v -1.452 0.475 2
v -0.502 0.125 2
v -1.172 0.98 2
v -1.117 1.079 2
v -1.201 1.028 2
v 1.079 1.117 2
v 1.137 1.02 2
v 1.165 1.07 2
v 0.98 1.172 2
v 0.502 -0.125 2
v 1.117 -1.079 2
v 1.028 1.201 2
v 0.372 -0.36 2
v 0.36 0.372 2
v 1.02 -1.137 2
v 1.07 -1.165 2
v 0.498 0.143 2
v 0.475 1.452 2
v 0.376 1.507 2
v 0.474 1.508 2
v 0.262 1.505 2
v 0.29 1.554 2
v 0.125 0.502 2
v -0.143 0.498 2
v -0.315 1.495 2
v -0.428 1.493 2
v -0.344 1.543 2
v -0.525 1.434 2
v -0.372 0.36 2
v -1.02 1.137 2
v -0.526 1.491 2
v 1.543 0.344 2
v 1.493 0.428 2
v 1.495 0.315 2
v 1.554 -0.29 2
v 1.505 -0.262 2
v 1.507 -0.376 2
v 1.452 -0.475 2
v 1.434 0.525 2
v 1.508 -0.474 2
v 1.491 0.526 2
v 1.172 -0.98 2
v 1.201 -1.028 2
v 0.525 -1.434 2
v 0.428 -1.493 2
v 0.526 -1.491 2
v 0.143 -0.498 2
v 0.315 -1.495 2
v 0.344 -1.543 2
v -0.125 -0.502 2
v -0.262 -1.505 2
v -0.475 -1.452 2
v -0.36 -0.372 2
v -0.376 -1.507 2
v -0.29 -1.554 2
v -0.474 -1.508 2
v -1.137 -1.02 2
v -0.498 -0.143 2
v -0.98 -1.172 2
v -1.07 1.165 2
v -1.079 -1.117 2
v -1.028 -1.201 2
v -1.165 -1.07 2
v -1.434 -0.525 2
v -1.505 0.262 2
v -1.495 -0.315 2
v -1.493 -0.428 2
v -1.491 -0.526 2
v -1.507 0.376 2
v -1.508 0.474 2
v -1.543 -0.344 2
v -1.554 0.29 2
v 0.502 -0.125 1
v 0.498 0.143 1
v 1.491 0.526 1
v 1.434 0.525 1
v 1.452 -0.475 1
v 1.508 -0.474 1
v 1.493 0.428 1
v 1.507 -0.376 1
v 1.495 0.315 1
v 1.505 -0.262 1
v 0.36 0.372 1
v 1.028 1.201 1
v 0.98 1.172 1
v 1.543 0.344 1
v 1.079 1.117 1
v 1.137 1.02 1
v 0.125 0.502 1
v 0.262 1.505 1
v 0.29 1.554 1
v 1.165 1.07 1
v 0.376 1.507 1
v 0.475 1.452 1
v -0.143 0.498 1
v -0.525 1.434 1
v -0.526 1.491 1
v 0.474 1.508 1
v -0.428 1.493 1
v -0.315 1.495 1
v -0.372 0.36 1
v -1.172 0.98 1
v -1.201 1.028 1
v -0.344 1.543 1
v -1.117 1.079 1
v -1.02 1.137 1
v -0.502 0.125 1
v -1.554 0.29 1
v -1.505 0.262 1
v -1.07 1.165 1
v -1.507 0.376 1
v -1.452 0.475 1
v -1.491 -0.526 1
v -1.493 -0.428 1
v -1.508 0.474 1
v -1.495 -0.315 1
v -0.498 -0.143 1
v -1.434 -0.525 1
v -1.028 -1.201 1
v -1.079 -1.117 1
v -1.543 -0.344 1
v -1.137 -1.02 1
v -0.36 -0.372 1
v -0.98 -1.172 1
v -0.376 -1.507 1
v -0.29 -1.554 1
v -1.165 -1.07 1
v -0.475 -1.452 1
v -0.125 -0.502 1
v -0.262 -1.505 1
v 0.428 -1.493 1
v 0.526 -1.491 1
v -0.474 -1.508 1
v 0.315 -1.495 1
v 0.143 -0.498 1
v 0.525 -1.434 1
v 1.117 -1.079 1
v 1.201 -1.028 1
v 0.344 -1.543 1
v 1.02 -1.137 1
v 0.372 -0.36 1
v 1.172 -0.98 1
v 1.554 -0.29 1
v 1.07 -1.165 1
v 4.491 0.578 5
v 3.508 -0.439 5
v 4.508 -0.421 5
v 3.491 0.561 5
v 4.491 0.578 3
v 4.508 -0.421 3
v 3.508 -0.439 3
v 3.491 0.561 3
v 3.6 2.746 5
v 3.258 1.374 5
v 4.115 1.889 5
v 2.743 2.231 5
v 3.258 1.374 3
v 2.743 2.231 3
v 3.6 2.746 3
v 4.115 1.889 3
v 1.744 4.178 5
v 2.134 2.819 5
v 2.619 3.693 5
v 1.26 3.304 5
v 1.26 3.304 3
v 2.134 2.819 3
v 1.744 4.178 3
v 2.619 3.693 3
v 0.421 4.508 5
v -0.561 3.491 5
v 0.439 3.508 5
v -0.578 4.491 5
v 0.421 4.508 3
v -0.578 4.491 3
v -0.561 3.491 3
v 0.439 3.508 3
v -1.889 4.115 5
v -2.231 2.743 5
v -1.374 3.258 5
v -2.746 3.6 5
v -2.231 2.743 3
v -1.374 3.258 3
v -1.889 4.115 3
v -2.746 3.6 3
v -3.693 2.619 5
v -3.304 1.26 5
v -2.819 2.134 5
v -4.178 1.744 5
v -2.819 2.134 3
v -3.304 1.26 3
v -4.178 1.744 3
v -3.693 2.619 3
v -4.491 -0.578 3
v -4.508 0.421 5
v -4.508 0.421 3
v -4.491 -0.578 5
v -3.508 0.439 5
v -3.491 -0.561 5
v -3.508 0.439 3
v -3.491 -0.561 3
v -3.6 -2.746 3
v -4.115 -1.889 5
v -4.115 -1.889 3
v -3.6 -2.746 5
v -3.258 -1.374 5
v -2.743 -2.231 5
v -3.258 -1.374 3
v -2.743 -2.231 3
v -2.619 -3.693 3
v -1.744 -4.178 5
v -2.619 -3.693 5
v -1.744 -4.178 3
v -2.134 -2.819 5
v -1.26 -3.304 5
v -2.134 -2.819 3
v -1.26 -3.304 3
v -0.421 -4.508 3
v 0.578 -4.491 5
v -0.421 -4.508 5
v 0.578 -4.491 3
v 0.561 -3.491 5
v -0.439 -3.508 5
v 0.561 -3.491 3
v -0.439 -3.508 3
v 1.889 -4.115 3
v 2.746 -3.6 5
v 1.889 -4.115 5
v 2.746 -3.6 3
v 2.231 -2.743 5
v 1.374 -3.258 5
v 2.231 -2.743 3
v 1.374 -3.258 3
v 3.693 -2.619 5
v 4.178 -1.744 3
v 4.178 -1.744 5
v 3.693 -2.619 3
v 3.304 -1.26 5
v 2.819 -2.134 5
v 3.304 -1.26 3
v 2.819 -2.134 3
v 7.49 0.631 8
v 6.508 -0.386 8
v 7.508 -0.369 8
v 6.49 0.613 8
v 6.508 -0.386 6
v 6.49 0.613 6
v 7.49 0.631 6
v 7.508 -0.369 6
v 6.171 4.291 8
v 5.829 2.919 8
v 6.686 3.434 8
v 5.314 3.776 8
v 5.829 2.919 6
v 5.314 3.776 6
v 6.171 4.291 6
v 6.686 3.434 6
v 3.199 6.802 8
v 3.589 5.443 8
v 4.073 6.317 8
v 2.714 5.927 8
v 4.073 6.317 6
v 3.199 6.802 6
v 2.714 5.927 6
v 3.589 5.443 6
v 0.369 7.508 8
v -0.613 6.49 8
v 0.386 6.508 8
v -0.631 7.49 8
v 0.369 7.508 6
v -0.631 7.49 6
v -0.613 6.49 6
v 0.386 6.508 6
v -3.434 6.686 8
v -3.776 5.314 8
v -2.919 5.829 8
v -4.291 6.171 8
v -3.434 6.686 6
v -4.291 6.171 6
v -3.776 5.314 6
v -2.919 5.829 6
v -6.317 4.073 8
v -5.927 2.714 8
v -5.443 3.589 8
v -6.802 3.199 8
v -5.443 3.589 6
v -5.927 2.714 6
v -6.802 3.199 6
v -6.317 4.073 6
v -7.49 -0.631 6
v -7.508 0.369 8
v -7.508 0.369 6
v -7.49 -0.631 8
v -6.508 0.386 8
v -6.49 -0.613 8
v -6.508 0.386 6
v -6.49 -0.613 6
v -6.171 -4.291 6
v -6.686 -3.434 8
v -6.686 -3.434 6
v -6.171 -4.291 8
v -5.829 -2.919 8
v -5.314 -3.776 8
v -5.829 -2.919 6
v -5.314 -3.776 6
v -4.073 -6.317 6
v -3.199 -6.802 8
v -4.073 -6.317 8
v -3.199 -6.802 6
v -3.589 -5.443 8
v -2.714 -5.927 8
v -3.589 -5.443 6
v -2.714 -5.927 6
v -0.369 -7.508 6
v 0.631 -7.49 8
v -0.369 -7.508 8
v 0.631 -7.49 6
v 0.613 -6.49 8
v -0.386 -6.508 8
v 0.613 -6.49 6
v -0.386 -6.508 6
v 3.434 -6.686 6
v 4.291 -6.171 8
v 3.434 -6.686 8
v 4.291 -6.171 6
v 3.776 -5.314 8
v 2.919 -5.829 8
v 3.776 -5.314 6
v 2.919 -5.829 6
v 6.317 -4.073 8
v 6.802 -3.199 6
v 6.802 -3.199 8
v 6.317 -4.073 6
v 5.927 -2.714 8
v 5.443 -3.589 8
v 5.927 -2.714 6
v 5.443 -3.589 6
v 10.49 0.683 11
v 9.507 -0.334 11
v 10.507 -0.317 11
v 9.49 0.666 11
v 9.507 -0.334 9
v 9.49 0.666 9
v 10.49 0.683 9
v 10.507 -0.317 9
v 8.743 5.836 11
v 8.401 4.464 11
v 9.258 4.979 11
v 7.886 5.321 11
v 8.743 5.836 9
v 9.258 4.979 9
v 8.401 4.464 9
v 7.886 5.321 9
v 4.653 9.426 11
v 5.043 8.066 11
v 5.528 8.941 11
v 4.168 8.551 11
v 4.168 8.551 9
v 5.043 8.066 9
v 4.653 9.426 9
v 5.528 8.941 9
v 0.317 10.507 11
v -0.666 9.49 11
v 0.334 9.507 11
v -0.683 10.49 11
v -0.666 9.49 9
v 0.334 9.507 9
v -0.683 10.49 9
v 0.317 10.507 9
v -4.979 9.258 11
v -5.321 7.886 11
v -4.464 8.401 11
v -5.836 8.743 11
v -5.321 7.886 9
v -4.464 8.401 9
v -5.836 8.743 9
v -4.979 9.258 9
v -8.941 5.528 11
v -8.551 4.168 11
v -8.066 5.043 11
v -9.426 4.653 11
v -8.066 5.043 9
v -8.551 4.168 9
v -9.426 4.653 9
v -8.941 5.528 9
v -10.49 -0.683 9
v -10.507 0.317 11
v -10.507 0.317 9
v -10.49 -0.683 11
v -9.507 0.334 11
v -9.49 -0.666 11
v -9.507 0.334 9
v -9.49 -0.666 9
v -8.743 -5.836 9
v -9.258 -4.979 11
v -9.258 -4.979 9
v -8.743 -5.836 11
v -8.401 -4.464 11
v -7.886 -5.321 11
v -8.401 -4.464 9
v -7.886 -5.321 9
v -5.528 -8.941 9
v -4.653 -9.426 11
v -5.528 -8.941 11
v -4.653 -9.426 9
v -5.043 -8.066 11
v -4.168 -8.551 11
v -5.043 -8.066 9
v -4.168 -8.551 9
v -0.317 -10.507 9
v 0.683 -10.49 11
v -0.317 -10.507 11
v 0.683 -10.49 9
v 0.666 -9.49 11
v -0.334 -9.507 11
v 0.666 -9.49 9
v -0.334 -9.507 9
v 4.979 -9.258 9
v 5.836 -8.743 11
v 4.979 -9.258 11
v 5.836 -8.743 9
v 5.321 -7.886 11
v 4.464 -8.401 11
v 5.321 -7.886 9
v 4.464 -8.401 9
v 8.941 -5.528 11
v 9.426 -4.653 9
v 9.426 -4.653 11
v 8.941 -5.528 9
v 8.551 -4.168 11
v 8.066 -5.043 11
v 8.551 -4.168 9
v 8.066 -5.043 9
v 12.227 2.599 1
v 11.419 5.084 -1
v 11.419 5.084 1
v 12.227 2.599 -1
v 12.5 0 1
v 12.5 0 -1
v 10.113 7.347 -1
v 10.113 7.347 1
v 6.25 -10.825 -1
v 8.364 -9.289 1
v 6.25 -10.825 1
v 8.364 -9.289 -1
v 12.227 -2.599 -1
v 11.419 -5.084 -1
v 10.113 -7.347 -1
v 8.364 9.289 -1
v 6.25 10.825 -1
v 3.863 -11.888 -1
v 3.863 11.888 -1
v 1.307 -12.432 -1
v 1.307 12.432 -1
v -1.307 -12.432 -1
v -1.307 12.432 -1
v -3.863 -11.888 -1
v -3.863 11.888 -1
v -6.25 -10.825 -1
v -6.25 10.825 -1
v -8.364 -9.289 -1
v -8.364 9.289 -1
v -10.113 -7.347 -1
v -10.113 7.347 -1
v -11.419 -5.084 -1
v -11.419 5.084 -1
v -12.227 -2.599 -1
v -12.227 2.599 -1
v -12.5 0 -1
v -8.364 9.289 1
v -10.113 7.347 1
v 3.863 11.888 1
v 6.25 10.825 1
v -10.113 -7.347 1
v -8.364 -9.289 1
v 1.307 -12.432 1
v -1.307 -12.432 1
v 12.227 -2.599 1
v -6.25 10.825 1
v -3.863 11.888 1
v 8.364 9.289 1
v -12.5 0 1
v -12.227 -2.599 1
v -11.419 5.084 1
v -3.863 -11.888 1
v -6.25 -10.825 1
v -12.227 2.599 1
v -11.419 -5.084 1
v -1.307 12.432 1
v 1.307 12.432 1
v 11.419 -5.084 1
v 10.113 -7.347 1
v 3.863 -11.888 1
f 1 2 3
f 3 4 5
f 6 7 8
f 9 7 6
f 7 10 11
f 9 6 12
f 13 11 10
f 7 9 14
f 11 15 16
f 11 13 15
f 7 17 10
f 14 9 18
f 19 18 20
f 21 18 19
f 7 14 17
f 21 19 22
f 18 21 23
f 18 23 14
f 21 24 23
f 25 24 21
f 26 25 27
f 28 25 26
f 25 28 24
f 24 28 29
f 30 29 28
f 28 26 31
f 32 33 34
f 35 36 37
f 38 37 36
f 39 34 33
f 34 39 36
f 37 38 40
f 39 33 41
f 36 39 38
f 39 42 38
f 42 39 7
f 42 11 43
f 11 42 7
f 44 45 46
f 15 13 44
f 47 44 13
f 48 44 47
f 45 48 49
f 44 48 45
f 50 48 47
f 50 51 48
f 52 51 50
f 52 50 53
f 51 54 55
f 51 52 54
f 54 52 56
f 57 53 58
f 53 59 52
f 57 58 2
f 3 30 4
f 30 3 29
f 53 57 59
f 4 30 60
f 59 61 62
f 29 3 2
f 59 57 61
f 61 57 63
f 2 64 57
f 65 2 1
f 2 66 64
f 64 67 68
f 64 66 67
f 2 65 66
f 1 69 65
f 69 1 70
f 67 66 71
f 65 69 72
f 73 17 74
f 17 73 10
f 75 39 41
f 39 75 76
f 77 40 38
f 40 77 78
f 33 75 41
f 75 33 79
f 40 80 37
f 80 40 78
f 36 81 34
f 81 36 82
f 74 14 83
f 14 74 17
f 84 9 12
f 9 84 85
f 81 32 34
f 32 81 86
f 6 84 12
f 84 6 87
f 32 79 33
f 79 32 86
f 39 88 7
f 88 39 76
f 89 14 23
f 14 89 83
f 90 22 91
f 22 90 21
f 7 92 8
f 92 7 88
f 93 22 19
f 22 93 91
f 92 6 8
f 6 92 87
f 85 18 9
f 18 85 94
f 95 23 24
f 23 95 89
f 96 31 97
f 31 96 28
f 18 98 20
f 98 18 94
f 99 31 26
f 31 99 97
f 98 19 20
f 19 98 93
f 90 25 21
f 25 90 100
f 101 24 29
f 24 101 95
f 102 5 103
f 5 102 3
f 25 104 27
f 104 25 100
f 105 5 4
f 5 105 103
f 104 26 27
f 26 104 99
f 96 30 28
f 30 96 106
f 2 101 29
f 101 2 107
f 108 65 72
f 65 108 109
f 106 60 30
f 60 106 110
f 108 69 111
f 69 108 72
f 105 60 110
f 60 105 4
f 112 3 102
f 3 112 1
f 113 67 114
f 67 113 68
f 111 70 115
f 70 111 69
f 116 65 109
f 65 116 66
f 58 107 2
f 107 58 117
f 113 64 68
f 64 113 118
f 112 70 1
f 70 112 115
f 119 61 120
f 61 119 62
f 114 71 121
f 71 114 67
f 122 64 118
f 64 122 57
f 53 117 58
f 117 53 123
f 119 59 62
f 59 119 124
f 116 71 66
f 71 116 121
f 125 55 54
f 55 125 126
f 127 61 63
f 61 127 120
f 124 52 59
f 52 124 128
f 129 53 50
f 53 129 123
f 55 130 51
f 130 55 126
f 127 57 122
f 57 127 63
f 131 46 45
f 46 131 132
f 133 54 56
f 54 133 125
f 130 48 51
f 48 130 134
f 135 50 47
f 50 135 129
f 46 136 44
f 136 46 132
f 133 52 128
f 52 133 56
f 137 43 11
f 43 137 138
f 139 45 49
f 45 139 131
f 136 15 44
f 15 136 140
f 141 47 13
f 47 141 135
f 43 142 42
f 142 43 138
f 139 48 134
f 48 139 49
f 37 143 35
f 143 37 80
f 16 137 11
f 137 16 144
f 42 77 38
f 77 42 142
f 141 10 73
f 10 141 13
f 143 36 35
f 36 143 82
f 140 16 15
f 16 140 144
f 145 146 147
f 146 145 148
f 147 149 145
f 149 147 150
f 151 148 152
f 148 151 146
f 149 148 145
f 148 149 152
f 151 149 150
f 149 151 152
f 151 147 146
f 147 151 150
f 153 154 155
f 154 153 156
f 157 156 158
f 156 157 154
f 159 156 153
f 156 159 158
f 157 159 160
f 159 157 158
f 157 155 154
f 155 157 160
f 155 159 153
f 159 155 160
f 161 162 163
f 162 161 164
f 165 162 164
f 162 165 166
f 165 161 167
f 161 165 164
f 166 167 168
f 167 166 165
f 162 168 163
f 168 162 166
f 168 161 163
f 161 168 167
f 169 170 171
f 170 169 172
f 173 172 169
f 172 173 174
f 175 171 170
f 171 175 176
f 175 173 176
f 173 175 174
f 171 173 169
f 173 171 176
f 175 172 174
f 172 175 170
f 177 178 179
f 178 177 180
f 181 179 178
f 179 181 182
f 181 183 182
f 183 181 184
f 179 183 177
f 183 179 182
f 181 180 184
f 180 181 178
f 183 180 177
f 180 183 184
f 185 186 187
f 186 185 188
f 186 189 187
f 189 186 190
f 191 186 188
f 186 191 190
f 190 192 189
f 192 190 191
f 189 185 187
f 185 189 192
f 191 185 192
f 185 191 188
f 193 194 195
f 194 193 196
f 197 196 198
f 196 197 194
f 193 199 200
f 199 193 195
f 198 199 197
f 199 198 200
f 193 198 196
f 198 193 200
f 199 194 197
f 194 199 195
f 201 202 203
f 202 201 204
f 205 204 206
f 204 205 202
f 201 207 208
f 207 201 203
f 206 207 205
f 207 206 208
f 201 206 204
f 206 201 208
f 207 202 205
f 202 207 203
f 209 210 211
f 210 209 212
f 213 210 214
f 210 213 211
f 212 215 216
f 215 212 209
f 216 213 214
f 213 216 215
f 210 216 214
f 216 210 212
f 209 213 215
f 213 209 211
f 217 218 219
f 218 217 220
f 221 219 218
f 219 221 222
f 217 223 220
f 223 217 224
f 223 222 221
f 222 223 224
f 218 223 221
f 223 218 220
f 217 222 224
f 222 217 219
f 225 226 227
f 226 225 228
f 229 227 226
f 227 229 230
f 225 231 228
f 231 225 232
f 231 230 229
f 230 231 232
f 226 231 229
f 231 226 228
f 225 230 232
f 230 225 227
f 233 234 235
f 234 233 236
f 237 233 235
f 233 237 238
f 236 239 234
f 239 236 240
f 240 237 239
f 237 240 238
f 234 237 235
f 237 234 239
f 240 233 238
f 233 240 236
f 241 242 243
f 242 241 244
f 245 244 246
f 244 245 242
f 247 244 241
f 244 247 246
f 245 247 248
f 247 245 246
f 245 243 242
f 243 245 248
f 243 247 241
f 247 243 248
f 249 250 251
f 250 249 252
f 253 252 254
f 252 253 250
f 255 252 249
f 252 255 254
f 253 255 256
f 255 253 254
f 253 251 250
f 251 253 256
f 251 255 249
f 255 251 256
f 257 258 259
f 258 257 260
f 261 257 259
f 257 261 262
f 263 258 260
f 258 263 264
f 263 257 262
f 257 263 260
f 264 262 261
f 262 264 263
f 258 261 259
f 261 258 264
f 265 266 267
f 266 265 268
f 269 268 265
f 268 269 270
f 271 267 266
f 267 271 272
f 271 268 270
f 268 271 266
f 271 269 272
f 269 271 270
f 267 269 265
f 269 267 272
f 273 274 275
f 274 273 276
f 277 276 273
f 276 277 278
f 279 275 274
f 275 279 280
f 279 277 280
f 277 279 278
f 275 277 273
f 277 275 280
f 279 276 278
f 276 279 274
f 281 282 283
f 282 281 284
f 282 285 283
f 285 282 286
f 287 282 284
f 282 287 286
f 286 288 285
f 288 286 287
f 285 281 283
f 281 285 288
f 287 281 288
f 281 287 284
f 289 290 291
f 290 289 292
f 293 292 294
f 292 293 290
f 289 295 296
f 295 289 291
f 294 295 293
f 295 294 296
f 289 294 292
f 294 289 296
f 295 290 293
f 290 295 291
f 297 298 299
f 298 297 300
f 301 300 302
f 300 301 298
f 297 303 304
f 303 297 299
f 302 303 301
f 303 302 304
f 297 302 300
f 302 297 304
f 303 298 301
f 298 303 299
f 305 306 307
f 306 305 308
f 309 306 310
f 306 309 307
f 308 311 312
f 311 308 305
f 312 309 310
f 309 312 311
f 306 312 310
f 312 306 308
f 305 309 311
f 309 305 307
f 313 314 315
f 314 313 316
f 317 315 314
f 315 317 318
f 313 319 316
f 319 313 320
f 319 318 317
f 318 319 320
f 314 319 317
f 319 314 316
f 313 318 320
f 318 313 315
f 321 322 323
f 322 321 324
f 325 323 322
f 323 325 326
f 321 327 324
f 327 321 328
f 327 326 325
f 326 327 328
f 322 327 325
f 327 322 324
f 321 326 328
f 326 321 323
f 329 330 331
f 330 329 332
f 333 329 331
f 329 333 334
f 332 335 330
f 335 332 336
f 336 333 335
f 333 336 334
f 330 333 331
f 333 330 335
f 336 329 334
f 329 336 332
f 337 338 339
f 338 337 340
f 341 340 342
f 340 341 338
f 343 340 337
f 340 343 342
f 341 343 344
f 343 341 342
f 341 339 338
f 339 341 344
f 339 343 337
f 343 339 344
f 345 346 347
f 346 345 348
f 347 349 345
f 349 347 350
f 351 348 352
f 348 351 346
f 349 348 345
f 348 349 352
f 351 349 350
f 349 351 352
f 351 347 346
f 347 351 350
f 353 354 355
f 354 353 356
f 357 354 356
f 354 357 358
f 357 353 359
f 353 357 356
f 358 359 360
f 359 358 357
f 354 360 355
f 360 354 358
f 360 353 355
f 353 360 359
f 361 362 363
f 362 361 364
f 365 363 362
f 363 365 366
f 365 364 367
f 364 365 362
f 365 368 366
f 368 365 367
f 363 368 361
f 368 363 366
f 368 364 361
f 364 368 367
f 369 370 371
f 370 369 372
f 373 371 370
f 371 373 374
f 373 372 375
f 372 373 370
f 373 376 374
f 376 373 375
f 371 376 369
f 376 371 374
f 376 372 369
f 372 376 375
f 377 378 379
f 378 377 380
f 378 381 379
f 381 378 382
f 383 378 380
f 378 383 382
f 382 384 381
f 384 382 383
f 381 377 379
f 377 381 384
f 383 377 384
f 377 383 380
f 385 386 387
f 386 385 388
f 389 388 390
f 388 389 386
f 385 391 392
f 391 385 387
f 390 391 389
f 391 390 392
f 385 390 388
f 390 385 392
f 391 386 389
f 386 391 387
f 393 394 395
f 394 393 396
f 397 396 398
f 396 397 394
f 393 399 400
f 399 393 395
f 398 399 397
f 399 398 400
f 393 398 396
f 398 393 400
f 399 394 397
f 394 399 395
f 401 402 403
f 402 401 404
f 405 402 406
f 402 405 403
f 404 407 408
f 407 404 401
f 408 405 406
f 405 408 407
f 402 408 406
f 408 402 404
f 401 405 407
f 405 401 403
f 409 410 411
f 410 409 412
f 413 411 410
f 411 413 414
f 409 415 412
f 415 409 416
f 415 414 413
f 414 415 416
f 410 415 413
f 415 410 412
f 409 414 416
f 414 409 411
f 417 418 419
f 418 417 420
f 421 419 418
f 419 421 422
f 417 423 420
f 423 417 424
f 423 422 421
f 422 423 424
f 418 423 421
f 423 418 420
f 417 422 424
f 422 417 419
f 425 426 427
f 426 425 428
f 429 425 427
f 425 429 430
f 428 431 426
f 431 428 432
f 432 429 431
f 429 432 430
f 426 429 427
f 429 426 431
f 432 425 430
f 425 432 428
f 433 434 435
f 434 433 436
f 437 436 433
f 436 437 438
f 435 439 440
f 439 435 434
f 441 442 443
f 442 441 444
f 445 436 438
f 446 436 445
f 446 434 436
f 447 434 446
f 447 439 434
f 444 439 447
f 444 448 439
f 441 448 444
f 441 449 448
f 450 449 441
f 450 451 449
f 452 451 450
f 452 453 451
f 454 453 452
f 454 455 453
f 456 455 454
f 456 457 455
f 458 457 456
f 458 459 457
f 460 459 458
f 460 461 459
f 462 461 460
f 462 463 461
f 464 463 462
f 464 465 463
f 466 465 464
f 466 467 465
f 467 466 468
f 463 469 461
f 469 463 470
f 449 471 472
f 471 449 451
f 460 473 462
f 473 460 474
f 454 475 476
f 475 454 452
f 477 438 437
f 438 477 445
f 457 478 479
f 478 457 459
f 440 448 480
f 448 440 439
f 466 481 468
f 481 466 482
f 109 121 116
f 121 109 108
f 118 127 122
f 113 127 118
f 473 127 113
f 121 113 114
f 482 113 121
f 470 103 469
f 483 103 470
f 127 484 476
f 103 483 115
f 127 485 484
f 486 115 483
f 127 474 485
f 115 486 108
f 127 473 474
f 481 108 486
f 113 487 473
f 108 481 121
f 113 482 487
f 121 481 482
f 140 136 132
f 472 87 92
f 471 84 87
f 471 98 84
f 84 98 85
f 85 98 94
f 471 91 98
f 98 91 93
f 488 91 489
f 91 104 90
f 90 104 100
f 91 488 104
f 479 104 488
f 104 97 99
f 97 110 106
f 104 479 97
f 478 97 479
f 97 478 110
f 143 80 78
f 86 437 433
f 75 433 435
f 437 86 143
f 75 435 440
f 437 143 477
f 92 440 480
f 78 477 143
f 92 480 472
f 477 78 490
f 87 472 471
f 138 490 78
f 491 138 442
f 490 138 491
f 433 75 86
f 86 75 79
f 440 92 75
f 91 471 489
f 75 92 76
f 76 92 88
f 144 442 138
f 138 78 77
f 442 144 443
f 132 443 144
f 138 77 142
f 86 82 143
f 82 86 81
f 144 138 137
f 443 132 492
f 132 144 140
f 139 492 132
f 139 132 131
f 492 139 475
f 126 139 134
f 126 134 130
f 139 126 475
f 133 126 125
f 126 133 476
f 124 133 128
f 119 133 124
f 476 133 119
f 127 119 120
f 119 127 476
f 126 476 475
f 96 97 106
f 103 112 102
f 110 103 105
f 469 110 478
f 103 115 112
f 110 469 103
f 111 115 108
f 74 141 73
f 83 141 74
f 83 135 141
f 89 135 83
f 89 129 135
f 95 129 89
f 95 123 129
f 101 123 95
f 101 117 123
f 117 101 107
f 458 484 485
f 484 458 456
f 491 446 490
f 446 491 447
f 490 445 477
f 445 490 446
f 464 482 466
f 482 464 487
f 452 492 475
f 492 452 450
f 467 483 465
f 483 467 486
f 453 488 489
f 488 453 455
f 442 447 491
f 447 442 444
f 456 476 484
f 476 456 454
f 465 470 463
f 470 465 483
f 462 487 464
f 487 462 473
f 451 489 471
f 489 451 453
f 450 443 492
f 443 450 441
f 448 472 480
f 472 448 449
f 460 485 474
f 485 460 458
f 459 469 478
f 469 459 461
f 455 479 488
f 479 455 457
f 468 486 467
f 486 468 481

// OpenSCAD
module s(){
  cube([1,1,2],center=true);
  }
  module main(){
      for(x=[1:3:10]){
  for(r=[1:30:360]){
  rotate([0,0,x*$t*360])
  
    rotate([0,0,r])
  translate([x,0,0]){
  translate([0,0,0.1*x*(1-sin($t*PI*60))*10])
  s();
  }
}
  }
}
color("gray")cylinder(2,12.5,12.5,center=true);
main();
